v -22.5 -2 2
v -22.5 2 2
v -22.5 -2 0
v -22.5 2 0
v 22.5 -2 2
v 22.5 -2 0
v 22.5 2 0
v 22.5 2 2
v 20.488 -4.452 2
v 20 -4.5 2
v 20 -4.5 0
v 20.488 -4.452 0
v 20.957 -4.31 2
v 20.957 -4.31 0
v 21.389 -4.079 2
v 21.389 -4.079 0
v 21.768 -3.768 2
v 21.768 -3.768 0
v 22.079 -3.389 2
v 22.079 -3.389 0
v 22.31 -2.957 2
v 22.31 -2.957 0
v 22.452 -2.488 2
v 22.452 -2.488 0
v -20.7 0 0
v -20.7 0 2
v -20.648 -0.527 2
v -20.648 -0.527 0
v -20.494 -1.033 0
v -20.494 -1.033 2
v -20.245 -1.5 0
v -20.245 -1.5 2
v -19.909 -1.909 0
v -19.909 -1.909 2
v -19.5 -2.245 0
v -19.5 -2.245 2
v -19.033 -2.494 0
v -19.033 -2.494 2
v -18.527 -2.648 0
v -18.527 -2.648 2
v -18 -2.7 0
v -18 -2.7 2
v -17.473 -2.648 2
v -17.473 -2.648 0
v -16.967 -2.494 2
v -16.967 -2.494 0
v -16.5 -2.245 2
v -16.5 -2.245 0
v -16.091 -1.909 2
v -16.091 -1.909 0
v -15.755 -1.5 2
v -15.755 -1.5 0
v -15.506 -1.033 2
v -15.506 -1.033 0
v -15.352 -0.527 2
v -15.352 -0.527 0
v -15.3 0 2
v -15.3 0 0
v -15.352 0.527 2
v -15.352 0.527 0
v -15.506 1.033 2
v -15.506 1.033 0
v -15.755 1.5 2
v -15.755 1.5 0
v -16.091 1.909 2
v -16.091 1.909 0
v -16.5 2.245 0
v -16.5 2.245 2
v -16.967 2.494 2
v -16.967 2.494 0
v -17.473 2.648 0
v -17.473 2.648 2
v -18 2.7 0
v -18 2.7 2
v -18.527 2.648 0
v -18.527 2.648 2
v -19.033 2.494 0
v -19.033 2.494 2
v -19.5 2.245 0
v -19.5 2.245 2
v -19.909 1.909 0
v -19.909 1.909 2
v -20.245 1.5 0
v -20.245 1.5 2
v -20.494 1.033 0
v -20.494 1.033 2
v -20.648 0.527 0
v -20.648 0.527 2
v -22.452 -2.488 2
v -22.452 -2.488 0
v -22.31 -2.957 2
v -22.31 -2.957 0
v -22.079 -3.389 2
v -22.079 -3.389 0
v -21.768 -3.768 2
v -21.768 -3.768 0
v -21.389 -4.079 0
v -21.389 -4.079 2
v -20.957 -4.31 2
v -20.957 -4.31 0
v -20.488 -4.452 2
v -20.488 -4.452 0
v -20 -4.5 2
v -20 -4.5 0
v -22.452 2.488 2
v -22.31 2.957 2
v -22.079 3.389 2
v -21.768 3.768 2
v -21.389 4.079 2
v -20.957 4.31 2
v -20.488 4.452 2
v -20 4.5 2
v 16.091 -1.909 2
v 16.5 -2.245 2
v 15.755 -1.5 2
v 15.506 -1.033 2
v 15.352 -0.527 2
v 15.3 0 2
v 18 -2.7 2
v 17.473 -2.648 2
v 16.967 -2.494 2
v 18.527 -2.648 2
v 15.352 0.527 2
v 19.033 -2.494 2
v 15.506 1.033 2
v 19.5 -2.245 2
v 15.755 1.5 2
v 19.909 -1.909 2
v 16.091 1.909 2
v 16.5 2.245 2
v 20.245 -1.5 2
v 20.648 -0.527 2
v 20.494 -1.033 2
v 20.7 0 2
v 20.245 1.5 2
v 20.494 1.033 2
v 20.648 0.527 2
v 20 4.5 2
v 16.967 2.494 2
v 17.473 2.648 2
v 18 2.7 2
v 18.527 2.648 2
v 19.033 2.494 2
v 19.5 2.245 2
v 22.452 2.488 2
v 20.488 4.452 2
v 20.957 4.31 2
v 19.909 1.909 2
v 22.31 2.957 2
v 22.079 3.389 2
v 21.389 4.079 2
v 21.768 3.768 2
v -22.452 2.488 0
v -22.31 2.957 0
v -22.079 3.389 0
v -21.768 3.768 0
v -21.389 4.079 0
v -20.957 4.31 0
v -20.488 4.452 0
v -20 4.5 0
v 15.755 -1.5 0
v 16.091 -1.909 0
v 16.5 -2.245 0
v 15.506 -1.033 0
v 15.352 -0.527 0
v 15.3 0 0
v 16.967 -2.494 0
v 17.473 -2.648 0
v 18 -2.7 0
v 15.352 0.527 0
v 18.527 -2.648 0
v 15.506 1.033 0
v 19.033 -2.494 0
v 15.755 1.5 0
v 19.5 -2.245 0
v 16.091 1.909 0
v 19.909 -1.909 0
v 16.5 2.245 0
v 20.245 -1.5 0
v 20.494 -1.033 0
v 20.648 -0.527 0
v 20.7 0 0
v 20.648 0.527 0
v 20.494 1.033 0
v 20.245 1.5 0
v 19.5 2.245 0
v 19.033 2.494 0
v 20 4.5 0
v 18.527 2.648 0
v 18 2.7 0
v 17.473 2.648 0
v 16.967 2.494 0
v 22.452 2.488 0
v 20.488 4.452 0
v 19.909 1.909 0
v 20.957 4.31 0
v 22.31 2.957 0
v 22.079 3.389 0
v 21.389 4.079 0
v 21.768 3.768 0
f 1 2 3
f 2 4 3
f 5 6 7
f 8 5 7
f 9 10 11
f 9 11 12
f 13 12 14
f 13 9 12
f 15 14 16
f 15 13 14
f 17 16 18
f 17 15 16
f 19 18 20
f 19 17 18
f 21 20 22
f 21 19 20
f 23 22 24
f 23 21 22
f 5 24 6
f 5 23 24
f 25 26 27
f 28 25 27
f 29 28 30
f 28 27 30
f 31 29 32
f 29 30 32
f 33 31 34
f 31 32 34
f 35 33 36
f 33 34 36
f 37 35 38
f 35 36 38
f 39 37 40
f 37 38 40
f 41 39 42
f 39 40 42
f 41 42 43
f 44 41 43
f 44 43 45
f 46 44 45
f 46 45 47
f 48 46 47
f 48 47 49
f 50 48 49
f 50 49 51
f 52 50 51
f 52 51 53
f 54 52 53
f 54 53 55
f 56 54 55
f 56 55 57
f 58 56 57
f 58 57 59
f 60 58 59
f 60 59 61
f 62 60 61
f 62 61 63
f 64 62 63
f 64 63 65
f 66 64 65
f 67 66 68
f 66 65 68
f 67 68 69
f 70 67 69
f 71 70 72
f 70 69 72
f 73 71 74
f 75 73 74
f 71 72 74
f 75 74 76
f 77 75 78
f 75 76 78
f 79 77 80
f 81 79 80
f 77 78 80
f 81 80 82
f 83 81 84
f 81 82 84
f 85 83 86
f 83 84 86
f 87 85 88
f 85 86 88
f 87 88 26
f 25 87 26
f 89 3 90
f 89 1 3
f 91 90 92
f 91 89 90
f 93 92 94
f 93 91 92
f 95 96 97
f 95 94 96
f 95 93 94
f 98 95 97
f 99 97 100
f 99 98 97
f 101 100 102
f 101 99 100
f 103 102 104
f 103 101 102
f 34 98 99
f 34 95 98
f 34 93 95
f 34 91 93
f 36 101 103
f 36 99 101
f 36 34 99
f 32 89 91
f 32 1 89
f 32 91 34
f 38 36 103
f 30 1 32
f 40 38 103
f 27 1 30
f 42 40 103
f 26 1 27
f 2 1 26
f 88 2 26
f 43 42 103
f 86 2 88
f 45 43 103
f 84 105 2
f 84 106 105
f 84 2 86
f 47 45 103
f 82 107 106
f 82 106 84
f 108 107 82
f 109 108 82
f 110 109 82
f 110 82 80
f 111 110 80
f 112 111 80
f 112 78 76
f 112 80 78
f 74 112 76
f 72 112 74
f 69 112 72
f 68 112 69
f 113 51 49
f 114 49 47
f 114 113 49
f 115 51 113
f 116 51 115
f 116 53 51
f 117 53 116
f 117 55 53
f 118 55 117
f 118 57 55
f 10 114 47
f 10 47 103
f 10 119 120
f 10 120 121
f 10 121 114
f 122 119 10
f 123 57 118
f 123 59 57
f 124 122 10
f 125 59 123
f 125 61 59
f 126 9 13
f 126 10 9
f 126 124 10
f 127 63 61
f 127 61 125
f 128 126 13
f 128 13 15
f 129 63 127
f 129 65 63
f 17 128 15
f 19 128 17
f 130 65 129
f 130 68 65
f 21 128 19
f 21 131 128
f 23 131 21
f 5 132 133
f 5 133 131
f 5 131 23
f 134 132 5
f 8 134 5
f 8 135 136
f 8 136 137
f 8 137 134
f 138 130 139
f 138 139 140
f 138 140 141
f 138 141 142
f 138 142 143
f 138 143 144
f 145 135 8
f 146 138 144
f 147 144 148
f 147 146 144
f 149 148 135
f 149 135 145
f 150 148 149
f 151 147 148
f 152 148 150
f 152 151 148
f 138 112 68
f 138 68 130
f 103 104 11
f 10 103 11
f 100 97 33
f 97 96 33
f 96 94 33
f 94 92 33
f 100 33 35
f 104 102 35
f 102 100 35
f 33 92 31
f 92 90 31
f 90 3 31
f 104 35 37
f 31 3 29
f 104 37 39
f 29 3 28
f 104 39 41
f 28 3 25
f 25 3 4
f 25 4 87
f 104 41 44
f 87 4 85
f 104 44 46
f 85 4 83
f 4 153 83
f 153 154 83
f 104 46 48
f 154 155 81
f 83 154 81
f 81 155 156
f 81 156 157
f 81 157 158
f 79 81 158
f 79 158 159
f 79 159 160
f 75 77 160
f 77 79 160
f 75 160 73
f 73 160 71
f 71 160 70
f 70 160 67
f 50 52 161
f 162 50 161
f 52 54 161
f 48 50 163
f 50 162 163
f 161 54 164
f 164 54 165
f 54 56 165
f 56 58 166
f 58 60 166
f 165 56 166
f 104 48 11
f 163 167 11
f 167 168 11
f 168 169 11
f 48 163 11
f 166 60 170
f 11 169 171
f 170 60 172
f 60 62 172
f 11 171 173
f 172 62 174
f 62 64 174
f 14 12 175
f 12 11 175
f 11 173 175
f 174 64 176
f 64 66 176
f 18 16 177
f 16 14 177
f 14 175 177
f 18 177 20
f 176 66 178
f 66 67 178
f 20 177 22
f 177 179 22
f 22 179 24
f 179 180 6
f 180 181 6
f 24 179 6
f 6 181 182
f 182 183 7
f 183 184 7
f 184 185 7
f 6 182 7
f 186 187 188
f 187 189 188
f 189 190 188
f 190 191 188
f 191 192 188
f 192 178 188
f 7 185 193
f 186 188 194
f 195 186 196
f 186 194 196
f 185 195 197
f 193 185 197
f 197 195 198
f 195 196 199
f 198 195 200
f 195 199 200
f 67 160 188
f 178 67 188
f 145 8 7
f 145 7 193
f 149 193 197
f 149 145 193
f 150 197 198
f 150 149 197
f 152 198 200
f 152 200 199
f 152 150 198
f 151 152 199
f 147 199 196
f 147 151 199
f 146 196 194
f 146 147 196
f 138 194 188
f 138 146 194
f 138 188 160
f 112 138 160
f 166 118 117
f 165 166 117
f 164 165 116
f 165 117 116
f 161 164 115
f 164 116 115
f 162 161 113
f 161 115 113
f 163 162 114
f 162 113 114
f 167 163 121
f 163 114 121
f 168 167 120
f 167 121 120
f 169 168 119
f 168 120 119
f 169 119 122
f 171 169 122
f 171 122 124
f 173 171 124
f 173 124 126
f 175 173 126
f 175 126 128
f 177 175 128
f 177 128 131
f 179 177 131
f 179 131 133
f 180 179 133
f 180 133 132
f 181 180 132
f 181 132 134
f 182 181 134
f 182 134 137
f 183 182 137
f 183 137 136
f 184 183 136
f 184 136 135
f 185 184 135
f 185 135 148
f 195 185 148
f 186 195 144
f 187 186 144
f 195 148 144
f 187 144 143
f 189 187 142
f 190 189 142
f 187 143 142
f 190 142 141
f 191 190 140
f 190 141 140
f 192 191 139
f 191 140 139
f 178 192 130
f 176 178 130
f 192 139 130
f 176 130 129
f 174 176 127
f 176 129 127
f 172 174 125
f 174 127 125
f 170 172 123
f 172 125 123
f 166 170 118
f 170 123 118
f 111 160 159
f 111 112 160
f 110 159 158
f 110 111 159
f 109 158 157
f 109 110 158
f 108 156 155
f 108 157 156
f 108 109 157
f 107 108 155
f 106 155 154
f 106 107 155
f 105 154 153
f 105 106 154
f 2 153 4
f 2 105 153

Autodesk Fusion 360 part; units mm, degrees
sketch "Sketch1" plane through (0, 0, 0) normal (0, 0, 1) x (1, 0, 0)
  line L0 (22.5, 4.5) -> (-22.5, 4.5)
  line L1 (-22.5, 4.5) -> (-22.5, -4.5)
  line L2 (-22.5, -4.5) -> (22.5, -4.5)
  line L3 (22.5, -4.5) -> (22.5, 4.5)
  line L4 (22.5, 4.5) -> (-22.5, -4.5) construction
  line L5 (-22.5, 4.5) -> (22.5, -4.5) construction
  dimension "d1" = 45
  dimension "d2" = 9
extrude "Extrude1" add sketch "Sketch1" along normal blind 2
fillet "Fillet1" radius 2.5 4 edges at (-22.5, -4.5, 1) (-22.5, 4.5, 1) (22.5, -4.5, 1) (22.5, 4.5, 1)
sketch "Sketch2" plane through (0, 0, 2) normal (0, 0, 1) x (-1, 0, 0)
  arc A0 (-22.5, -2) -> (-20, -4.5) centre (-20, -2) ccw
  line L0 (-20, -4.5) -> (20, -4.5)
  arc A1 (20, -4.5) -> (22.5, -2) centre (20, -2) ccw
  line L1 (20, 4.5) -> (-20, 4.5)
  line L2 (22.5, -2) -> (22.5, 2)
  arc A2 (22.5, 2) -> (20, 4.5) centre (20, 2) ccw
  arc A3 (-20, 4.5) -> (-22.5, 2) centre (-20, 2) ccw
  line L3 (-22.5, 2) -> (-22.5, -2)
  line L4 (22.5, 0) -> (-22.5, 0) construction
  line L5 (22.5, 0) -> (18, 0)
  line L6 (-22.5, 0) -> (-18, 0)
  circle A4 centre (18, 0) radius 2.7
  circle A5 centre (-18, 0) radius 2.7
  dimension "d11" = 4.5
  dimension "d12" = 4.5
  dimension "d13" = 5.4
  dimension "d14" = 5.4
extrude "Extrude2" cut sketch "Sketch2" against normal blind 2 contours A4 | A5
